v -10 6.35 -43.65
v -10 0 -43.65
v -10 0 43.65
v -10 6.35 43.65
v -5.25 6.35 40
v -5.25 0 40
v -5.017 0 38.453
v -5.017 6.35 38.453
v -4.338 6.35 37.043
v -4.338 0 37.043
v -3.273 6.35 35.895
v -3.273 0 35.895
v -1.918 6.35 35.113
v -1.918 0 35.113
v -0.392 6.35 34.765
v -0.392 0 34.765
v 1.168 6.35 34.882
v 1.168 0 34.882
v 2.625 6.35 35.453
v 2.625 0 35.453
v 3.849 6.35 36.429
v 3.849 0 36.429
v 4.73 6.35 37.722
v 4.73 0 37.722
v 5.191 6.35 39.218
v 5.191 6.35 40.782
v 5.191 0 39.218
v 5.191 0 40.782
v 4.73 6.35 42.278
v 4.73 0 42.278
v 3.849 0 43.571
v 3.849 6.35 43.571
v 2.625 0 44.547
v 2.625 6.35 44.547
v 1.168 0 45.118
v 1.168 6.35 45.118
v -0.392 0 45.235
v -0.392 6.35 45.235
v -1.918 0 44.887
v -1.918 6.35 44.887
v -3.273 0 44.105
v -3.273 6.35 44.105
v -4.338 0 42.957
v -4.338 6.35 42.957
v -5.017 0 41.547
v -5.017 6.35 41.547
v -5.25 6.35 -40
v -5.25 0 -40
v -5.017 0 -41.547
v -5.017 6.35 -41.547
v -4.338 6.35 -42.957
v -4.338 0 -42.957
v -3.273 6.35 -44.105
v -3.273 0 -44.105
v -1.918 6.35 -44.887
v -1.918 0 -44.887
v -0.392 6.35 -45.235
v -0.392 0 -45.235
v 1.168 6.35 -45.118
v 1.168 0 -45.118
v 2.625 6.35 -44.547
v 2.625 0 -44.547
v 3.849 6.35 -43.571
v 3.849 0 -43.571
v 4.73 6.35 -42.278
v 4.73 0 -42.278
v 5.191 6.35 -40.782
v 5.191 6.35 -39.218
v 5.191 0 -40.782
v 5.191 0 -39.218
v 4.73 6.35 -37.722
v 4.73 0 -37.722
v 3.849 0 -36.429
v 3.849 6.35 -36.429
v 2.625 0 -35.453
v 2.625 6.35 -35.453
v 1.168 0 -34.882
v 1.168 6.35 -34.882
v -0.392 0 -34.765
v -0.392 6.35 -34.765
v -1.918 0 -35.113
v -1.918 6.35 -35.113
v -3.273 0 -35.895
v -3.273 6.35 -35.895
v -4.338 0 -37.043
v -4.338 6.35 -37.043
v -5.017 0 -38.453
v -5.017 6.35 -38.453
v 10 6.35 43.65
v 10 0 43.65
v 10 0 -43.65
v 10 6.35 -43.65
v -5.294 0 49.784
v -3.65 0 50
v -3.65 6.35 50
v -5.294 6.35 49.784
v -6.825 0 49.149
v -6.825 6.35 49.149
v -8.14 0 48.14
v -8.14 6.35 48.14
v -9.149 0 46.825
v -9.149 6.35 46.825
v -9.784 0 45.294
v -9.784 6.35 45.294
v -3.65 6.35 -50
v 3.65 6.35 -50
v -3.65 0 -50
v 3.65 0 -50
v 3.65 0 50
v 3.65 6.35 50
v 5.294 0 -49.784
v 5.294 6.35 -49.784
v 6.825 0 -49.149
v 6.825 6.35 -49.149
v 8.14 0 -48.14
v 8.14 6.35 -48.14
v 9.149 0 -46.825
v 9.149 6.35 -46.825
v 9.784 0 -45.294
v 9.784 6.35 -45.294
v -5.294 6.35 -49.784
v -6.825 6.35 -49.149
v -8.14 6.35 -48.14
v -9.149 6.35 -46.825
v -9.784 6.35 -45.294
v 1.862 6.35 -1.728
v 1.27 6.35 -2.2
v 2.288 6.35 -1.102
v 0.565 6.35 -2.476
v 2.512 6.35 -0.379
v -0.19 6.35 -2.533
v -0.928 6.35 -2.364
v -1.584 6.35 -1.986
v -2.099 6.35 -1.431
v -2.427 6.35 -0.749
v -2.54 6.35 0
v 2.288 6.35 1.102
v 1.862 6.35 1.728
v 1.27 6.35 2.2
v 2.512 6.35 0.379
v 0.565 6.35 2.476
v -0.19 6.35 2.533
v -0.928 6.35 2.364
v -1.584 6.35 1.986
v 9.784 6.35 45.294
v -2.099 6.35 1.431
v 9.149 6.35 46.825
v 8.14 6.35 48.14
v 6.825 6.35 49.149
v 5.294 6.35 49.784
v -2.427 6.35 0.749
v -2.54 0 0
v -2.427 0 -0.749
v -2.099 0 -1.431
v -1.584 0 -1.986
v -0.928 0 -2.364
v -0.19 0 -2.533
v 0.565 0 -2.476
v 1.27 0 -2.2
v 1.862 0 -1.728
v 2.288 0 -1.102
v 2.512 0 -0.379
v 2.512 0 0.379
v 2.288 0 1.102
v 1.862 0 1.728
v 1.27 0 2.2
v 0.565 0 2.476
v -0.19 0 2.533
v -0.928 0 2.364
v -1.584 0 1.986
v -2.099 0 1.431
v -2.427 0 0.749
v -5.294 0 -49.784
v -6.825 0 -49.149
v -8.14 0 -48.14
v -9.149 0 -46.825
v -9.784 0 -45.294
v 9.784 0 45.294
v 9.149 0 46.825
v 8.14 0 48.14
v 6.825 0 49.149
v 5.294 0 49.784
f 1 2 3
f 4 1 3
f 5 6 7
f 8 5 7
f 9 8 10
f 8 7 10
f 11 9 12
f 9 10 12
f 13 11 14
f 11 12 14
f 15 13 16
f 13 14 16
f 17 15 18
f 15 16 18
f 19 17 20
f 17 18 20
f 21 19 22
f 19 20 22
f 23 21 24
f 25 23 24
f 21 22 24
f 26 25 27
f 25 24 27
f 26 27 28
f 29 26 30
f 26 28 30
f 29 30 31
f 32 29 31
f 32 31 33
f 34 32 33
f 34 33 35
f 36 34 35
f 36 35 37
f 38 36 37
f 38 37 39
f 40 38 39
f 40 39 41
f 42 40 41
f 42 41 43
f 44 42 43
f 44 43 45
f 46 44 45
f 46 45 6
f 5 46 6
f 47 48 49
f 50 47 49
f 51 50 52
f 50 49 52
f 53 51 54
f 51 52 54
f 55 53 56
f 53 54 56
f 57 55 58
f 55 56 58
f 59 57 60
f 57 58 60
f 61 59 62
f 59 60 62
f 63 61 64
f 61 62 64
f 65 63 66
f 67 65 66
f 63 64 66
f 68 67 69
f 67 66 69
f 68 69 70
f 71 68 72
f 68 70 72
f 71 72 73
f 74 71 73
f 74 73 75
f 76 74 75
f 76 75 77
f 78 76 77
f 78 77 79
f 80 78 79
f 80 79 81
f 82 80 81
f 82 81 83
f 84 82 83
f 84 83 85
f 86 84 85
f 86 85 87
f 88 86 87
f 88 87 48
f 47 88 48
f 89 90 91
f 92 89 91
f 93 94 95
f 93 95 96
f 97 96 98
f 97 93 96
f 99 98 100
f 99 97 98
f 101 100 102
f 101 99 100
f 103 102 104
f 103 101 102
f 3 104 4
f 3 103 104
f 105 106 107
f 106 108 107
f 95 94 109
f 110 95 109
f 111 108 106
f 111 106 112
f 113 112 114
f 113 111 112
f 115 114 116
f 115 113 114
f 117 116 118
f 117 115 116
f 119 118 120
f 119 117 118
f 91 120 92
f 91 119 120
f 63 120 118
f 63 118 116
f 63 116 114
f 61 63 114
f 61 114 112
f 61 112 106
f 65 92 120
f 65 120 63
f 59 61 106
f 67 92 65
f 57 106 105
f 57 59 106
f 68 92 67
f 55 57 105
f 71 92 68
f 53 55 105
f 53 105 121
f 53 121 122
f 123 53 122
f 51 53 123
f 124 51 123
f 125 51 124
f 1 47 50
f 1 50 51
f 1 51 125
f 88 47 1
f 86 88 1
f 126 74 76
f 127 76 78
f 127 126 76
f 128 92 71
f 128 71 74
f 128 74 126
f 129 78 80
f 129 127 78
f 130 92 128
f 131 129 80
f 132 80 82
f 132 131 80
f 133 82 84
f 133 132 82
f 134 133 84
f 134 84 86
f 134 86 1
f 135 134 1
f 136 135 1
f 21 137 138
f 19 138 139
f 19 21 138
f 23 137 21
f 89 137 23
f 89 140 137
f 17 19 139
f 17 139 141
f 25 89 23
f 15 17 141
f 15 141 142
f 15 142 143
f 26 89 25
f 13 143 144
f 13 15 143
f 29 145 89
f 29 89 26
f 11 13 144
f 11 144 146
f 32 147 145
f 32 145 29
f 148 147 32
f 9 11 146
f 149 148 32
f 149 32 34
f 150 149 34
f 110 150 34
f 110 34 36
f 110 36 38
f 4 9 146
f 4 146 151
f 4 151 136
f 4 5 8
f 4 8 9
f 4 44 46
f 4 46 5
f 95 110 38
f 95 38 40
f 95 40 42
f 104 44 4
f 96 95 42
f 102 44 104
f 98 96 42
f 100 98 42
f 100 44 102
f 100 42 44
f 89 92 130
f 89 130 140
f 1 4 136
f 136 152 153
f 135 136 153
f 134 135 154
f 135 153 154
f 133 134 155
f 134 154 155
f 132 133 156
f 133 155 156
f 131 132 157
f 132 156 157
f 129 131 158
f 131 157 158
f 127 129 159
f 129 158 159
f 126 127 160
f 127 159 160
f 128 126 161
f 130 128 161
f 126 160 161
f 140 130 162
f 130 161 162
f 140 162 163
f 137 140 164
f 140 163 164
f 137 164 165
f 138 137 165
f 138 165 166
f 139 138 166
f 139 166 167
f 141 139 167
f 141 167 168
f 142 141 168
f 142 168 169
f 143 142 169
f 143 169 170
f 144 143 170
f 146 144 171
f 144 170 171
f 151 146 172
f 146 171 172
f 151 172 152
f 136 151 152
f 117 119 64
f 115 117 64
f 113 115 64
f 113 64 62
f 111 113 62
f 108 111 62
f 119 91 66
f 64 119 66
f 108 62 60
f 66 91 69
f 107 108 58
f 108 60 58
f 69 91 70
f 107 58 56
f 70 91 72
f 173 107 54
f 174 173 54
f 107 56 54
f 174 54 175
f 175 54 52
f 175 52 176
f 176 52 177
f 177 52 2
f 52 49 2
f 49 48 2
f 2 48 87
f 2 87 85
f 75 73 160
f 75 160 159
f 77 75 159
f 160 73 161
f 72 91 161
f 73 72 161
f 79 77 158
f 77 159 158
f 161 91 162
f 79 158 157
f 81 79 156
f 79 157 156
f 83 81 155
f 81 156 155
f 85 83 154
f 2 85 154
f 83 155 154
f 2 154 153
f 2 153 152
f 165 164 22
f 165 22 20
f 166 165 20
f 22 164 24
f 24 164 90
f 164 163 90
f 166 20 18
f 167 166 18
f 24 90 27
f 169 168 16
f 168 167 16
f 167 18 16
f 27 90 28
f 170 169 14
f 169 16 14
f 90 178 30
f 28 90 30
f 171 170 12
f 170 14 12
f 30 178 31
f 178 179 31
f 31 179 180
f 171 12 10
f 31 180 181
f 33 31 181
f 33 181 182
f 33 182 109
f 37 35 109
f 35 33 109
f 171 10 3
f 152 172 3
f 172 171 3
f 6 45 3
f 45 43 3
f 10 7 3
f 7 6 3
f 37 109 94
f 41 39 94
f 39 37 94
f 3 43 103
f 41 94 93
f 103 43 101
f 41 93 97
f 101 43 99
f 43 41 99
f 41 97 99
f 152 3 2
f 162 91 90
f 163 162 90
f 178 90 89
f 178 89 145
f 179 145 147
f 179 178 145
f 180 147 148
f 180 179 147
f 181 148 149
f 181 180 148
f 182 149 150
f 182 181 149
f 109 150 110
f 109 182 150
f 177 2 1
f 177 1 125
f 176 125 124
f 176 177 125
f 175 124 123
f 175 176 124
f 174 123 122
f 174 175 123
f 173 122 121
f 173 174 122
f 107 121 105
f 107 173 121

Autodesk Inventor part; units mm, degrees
ref_plane "YZ Plane" through (0, 0, 0) normal (1, 0, 0) x (0, 1, 0)
ref_plane "XZ Plane" through (0, 0, 0) normal (0, 1, 0) x (-1, 0, 0)
ref_plane "XY Plane" through (0, 0, 0) normal (0, 0, 1) x (1, 0, 0)
sketch "Sketch1" plane through (0, 0, 0) normal (0, 1, 0) x (-1, 0, 0)
  line L0 (-3.65, -50) -> (3.65, -50)
  line L1 (10, -43.65) -> (10, 43.65)
  line L2 (3.65, 50) -> (-3.65, 50)
  line L3 (-10, 43.65) -> (-10, -43.65)
  line L4 (-10, -50) -> (10, 50) construction
  line L5 (10, -50) -> (-10, 50) construction
  line L6 (37.1563, 0) -> (-27.0395, 0)
  circle A0 centre (0, 40) radius 5.25
  line L7 (0, 56.6322) -> (0, -75.9879)
  circle A1 centre (0, -40) radius 5.25
  arc A2 (10, 43.65) -> (3.65, 50) centre (3.65, 43.65) ccw
  arc A3 (-3.65, 50) -> (-10, 43.65) centre (-3.65, 43.65) ccw
  arc A4 (-10, -43.65) -> (-3.65, -50) centre (-3.65, -43.65) ccw
  arc A5 (3.65, -50) -> (10, -43.65) centre (3.65, -43.65) ccw
  circle A6 centre (0, 0) radius 2.54
  point P0 (0, 0)
  dimension "d0" = 100
  dimension "d1" = 20
  dimension "d2" = 10.5
  dimension "d3" = 80
  dimension "d4" = 6.35
  dimension "d7" = 5.08
extrude "Extrusion1" add sketch "Sketch1" along normal blind 6.35 contours A4 L3 L6 A6 L7 A1 L0 | L7 A1 A6 L6 L1 A5 L0 | L3 A3 L2 L7 A0 A6 L6 | L6 A6 L7 A0 L2 A2 L1
properties part number "Support_Plate"
